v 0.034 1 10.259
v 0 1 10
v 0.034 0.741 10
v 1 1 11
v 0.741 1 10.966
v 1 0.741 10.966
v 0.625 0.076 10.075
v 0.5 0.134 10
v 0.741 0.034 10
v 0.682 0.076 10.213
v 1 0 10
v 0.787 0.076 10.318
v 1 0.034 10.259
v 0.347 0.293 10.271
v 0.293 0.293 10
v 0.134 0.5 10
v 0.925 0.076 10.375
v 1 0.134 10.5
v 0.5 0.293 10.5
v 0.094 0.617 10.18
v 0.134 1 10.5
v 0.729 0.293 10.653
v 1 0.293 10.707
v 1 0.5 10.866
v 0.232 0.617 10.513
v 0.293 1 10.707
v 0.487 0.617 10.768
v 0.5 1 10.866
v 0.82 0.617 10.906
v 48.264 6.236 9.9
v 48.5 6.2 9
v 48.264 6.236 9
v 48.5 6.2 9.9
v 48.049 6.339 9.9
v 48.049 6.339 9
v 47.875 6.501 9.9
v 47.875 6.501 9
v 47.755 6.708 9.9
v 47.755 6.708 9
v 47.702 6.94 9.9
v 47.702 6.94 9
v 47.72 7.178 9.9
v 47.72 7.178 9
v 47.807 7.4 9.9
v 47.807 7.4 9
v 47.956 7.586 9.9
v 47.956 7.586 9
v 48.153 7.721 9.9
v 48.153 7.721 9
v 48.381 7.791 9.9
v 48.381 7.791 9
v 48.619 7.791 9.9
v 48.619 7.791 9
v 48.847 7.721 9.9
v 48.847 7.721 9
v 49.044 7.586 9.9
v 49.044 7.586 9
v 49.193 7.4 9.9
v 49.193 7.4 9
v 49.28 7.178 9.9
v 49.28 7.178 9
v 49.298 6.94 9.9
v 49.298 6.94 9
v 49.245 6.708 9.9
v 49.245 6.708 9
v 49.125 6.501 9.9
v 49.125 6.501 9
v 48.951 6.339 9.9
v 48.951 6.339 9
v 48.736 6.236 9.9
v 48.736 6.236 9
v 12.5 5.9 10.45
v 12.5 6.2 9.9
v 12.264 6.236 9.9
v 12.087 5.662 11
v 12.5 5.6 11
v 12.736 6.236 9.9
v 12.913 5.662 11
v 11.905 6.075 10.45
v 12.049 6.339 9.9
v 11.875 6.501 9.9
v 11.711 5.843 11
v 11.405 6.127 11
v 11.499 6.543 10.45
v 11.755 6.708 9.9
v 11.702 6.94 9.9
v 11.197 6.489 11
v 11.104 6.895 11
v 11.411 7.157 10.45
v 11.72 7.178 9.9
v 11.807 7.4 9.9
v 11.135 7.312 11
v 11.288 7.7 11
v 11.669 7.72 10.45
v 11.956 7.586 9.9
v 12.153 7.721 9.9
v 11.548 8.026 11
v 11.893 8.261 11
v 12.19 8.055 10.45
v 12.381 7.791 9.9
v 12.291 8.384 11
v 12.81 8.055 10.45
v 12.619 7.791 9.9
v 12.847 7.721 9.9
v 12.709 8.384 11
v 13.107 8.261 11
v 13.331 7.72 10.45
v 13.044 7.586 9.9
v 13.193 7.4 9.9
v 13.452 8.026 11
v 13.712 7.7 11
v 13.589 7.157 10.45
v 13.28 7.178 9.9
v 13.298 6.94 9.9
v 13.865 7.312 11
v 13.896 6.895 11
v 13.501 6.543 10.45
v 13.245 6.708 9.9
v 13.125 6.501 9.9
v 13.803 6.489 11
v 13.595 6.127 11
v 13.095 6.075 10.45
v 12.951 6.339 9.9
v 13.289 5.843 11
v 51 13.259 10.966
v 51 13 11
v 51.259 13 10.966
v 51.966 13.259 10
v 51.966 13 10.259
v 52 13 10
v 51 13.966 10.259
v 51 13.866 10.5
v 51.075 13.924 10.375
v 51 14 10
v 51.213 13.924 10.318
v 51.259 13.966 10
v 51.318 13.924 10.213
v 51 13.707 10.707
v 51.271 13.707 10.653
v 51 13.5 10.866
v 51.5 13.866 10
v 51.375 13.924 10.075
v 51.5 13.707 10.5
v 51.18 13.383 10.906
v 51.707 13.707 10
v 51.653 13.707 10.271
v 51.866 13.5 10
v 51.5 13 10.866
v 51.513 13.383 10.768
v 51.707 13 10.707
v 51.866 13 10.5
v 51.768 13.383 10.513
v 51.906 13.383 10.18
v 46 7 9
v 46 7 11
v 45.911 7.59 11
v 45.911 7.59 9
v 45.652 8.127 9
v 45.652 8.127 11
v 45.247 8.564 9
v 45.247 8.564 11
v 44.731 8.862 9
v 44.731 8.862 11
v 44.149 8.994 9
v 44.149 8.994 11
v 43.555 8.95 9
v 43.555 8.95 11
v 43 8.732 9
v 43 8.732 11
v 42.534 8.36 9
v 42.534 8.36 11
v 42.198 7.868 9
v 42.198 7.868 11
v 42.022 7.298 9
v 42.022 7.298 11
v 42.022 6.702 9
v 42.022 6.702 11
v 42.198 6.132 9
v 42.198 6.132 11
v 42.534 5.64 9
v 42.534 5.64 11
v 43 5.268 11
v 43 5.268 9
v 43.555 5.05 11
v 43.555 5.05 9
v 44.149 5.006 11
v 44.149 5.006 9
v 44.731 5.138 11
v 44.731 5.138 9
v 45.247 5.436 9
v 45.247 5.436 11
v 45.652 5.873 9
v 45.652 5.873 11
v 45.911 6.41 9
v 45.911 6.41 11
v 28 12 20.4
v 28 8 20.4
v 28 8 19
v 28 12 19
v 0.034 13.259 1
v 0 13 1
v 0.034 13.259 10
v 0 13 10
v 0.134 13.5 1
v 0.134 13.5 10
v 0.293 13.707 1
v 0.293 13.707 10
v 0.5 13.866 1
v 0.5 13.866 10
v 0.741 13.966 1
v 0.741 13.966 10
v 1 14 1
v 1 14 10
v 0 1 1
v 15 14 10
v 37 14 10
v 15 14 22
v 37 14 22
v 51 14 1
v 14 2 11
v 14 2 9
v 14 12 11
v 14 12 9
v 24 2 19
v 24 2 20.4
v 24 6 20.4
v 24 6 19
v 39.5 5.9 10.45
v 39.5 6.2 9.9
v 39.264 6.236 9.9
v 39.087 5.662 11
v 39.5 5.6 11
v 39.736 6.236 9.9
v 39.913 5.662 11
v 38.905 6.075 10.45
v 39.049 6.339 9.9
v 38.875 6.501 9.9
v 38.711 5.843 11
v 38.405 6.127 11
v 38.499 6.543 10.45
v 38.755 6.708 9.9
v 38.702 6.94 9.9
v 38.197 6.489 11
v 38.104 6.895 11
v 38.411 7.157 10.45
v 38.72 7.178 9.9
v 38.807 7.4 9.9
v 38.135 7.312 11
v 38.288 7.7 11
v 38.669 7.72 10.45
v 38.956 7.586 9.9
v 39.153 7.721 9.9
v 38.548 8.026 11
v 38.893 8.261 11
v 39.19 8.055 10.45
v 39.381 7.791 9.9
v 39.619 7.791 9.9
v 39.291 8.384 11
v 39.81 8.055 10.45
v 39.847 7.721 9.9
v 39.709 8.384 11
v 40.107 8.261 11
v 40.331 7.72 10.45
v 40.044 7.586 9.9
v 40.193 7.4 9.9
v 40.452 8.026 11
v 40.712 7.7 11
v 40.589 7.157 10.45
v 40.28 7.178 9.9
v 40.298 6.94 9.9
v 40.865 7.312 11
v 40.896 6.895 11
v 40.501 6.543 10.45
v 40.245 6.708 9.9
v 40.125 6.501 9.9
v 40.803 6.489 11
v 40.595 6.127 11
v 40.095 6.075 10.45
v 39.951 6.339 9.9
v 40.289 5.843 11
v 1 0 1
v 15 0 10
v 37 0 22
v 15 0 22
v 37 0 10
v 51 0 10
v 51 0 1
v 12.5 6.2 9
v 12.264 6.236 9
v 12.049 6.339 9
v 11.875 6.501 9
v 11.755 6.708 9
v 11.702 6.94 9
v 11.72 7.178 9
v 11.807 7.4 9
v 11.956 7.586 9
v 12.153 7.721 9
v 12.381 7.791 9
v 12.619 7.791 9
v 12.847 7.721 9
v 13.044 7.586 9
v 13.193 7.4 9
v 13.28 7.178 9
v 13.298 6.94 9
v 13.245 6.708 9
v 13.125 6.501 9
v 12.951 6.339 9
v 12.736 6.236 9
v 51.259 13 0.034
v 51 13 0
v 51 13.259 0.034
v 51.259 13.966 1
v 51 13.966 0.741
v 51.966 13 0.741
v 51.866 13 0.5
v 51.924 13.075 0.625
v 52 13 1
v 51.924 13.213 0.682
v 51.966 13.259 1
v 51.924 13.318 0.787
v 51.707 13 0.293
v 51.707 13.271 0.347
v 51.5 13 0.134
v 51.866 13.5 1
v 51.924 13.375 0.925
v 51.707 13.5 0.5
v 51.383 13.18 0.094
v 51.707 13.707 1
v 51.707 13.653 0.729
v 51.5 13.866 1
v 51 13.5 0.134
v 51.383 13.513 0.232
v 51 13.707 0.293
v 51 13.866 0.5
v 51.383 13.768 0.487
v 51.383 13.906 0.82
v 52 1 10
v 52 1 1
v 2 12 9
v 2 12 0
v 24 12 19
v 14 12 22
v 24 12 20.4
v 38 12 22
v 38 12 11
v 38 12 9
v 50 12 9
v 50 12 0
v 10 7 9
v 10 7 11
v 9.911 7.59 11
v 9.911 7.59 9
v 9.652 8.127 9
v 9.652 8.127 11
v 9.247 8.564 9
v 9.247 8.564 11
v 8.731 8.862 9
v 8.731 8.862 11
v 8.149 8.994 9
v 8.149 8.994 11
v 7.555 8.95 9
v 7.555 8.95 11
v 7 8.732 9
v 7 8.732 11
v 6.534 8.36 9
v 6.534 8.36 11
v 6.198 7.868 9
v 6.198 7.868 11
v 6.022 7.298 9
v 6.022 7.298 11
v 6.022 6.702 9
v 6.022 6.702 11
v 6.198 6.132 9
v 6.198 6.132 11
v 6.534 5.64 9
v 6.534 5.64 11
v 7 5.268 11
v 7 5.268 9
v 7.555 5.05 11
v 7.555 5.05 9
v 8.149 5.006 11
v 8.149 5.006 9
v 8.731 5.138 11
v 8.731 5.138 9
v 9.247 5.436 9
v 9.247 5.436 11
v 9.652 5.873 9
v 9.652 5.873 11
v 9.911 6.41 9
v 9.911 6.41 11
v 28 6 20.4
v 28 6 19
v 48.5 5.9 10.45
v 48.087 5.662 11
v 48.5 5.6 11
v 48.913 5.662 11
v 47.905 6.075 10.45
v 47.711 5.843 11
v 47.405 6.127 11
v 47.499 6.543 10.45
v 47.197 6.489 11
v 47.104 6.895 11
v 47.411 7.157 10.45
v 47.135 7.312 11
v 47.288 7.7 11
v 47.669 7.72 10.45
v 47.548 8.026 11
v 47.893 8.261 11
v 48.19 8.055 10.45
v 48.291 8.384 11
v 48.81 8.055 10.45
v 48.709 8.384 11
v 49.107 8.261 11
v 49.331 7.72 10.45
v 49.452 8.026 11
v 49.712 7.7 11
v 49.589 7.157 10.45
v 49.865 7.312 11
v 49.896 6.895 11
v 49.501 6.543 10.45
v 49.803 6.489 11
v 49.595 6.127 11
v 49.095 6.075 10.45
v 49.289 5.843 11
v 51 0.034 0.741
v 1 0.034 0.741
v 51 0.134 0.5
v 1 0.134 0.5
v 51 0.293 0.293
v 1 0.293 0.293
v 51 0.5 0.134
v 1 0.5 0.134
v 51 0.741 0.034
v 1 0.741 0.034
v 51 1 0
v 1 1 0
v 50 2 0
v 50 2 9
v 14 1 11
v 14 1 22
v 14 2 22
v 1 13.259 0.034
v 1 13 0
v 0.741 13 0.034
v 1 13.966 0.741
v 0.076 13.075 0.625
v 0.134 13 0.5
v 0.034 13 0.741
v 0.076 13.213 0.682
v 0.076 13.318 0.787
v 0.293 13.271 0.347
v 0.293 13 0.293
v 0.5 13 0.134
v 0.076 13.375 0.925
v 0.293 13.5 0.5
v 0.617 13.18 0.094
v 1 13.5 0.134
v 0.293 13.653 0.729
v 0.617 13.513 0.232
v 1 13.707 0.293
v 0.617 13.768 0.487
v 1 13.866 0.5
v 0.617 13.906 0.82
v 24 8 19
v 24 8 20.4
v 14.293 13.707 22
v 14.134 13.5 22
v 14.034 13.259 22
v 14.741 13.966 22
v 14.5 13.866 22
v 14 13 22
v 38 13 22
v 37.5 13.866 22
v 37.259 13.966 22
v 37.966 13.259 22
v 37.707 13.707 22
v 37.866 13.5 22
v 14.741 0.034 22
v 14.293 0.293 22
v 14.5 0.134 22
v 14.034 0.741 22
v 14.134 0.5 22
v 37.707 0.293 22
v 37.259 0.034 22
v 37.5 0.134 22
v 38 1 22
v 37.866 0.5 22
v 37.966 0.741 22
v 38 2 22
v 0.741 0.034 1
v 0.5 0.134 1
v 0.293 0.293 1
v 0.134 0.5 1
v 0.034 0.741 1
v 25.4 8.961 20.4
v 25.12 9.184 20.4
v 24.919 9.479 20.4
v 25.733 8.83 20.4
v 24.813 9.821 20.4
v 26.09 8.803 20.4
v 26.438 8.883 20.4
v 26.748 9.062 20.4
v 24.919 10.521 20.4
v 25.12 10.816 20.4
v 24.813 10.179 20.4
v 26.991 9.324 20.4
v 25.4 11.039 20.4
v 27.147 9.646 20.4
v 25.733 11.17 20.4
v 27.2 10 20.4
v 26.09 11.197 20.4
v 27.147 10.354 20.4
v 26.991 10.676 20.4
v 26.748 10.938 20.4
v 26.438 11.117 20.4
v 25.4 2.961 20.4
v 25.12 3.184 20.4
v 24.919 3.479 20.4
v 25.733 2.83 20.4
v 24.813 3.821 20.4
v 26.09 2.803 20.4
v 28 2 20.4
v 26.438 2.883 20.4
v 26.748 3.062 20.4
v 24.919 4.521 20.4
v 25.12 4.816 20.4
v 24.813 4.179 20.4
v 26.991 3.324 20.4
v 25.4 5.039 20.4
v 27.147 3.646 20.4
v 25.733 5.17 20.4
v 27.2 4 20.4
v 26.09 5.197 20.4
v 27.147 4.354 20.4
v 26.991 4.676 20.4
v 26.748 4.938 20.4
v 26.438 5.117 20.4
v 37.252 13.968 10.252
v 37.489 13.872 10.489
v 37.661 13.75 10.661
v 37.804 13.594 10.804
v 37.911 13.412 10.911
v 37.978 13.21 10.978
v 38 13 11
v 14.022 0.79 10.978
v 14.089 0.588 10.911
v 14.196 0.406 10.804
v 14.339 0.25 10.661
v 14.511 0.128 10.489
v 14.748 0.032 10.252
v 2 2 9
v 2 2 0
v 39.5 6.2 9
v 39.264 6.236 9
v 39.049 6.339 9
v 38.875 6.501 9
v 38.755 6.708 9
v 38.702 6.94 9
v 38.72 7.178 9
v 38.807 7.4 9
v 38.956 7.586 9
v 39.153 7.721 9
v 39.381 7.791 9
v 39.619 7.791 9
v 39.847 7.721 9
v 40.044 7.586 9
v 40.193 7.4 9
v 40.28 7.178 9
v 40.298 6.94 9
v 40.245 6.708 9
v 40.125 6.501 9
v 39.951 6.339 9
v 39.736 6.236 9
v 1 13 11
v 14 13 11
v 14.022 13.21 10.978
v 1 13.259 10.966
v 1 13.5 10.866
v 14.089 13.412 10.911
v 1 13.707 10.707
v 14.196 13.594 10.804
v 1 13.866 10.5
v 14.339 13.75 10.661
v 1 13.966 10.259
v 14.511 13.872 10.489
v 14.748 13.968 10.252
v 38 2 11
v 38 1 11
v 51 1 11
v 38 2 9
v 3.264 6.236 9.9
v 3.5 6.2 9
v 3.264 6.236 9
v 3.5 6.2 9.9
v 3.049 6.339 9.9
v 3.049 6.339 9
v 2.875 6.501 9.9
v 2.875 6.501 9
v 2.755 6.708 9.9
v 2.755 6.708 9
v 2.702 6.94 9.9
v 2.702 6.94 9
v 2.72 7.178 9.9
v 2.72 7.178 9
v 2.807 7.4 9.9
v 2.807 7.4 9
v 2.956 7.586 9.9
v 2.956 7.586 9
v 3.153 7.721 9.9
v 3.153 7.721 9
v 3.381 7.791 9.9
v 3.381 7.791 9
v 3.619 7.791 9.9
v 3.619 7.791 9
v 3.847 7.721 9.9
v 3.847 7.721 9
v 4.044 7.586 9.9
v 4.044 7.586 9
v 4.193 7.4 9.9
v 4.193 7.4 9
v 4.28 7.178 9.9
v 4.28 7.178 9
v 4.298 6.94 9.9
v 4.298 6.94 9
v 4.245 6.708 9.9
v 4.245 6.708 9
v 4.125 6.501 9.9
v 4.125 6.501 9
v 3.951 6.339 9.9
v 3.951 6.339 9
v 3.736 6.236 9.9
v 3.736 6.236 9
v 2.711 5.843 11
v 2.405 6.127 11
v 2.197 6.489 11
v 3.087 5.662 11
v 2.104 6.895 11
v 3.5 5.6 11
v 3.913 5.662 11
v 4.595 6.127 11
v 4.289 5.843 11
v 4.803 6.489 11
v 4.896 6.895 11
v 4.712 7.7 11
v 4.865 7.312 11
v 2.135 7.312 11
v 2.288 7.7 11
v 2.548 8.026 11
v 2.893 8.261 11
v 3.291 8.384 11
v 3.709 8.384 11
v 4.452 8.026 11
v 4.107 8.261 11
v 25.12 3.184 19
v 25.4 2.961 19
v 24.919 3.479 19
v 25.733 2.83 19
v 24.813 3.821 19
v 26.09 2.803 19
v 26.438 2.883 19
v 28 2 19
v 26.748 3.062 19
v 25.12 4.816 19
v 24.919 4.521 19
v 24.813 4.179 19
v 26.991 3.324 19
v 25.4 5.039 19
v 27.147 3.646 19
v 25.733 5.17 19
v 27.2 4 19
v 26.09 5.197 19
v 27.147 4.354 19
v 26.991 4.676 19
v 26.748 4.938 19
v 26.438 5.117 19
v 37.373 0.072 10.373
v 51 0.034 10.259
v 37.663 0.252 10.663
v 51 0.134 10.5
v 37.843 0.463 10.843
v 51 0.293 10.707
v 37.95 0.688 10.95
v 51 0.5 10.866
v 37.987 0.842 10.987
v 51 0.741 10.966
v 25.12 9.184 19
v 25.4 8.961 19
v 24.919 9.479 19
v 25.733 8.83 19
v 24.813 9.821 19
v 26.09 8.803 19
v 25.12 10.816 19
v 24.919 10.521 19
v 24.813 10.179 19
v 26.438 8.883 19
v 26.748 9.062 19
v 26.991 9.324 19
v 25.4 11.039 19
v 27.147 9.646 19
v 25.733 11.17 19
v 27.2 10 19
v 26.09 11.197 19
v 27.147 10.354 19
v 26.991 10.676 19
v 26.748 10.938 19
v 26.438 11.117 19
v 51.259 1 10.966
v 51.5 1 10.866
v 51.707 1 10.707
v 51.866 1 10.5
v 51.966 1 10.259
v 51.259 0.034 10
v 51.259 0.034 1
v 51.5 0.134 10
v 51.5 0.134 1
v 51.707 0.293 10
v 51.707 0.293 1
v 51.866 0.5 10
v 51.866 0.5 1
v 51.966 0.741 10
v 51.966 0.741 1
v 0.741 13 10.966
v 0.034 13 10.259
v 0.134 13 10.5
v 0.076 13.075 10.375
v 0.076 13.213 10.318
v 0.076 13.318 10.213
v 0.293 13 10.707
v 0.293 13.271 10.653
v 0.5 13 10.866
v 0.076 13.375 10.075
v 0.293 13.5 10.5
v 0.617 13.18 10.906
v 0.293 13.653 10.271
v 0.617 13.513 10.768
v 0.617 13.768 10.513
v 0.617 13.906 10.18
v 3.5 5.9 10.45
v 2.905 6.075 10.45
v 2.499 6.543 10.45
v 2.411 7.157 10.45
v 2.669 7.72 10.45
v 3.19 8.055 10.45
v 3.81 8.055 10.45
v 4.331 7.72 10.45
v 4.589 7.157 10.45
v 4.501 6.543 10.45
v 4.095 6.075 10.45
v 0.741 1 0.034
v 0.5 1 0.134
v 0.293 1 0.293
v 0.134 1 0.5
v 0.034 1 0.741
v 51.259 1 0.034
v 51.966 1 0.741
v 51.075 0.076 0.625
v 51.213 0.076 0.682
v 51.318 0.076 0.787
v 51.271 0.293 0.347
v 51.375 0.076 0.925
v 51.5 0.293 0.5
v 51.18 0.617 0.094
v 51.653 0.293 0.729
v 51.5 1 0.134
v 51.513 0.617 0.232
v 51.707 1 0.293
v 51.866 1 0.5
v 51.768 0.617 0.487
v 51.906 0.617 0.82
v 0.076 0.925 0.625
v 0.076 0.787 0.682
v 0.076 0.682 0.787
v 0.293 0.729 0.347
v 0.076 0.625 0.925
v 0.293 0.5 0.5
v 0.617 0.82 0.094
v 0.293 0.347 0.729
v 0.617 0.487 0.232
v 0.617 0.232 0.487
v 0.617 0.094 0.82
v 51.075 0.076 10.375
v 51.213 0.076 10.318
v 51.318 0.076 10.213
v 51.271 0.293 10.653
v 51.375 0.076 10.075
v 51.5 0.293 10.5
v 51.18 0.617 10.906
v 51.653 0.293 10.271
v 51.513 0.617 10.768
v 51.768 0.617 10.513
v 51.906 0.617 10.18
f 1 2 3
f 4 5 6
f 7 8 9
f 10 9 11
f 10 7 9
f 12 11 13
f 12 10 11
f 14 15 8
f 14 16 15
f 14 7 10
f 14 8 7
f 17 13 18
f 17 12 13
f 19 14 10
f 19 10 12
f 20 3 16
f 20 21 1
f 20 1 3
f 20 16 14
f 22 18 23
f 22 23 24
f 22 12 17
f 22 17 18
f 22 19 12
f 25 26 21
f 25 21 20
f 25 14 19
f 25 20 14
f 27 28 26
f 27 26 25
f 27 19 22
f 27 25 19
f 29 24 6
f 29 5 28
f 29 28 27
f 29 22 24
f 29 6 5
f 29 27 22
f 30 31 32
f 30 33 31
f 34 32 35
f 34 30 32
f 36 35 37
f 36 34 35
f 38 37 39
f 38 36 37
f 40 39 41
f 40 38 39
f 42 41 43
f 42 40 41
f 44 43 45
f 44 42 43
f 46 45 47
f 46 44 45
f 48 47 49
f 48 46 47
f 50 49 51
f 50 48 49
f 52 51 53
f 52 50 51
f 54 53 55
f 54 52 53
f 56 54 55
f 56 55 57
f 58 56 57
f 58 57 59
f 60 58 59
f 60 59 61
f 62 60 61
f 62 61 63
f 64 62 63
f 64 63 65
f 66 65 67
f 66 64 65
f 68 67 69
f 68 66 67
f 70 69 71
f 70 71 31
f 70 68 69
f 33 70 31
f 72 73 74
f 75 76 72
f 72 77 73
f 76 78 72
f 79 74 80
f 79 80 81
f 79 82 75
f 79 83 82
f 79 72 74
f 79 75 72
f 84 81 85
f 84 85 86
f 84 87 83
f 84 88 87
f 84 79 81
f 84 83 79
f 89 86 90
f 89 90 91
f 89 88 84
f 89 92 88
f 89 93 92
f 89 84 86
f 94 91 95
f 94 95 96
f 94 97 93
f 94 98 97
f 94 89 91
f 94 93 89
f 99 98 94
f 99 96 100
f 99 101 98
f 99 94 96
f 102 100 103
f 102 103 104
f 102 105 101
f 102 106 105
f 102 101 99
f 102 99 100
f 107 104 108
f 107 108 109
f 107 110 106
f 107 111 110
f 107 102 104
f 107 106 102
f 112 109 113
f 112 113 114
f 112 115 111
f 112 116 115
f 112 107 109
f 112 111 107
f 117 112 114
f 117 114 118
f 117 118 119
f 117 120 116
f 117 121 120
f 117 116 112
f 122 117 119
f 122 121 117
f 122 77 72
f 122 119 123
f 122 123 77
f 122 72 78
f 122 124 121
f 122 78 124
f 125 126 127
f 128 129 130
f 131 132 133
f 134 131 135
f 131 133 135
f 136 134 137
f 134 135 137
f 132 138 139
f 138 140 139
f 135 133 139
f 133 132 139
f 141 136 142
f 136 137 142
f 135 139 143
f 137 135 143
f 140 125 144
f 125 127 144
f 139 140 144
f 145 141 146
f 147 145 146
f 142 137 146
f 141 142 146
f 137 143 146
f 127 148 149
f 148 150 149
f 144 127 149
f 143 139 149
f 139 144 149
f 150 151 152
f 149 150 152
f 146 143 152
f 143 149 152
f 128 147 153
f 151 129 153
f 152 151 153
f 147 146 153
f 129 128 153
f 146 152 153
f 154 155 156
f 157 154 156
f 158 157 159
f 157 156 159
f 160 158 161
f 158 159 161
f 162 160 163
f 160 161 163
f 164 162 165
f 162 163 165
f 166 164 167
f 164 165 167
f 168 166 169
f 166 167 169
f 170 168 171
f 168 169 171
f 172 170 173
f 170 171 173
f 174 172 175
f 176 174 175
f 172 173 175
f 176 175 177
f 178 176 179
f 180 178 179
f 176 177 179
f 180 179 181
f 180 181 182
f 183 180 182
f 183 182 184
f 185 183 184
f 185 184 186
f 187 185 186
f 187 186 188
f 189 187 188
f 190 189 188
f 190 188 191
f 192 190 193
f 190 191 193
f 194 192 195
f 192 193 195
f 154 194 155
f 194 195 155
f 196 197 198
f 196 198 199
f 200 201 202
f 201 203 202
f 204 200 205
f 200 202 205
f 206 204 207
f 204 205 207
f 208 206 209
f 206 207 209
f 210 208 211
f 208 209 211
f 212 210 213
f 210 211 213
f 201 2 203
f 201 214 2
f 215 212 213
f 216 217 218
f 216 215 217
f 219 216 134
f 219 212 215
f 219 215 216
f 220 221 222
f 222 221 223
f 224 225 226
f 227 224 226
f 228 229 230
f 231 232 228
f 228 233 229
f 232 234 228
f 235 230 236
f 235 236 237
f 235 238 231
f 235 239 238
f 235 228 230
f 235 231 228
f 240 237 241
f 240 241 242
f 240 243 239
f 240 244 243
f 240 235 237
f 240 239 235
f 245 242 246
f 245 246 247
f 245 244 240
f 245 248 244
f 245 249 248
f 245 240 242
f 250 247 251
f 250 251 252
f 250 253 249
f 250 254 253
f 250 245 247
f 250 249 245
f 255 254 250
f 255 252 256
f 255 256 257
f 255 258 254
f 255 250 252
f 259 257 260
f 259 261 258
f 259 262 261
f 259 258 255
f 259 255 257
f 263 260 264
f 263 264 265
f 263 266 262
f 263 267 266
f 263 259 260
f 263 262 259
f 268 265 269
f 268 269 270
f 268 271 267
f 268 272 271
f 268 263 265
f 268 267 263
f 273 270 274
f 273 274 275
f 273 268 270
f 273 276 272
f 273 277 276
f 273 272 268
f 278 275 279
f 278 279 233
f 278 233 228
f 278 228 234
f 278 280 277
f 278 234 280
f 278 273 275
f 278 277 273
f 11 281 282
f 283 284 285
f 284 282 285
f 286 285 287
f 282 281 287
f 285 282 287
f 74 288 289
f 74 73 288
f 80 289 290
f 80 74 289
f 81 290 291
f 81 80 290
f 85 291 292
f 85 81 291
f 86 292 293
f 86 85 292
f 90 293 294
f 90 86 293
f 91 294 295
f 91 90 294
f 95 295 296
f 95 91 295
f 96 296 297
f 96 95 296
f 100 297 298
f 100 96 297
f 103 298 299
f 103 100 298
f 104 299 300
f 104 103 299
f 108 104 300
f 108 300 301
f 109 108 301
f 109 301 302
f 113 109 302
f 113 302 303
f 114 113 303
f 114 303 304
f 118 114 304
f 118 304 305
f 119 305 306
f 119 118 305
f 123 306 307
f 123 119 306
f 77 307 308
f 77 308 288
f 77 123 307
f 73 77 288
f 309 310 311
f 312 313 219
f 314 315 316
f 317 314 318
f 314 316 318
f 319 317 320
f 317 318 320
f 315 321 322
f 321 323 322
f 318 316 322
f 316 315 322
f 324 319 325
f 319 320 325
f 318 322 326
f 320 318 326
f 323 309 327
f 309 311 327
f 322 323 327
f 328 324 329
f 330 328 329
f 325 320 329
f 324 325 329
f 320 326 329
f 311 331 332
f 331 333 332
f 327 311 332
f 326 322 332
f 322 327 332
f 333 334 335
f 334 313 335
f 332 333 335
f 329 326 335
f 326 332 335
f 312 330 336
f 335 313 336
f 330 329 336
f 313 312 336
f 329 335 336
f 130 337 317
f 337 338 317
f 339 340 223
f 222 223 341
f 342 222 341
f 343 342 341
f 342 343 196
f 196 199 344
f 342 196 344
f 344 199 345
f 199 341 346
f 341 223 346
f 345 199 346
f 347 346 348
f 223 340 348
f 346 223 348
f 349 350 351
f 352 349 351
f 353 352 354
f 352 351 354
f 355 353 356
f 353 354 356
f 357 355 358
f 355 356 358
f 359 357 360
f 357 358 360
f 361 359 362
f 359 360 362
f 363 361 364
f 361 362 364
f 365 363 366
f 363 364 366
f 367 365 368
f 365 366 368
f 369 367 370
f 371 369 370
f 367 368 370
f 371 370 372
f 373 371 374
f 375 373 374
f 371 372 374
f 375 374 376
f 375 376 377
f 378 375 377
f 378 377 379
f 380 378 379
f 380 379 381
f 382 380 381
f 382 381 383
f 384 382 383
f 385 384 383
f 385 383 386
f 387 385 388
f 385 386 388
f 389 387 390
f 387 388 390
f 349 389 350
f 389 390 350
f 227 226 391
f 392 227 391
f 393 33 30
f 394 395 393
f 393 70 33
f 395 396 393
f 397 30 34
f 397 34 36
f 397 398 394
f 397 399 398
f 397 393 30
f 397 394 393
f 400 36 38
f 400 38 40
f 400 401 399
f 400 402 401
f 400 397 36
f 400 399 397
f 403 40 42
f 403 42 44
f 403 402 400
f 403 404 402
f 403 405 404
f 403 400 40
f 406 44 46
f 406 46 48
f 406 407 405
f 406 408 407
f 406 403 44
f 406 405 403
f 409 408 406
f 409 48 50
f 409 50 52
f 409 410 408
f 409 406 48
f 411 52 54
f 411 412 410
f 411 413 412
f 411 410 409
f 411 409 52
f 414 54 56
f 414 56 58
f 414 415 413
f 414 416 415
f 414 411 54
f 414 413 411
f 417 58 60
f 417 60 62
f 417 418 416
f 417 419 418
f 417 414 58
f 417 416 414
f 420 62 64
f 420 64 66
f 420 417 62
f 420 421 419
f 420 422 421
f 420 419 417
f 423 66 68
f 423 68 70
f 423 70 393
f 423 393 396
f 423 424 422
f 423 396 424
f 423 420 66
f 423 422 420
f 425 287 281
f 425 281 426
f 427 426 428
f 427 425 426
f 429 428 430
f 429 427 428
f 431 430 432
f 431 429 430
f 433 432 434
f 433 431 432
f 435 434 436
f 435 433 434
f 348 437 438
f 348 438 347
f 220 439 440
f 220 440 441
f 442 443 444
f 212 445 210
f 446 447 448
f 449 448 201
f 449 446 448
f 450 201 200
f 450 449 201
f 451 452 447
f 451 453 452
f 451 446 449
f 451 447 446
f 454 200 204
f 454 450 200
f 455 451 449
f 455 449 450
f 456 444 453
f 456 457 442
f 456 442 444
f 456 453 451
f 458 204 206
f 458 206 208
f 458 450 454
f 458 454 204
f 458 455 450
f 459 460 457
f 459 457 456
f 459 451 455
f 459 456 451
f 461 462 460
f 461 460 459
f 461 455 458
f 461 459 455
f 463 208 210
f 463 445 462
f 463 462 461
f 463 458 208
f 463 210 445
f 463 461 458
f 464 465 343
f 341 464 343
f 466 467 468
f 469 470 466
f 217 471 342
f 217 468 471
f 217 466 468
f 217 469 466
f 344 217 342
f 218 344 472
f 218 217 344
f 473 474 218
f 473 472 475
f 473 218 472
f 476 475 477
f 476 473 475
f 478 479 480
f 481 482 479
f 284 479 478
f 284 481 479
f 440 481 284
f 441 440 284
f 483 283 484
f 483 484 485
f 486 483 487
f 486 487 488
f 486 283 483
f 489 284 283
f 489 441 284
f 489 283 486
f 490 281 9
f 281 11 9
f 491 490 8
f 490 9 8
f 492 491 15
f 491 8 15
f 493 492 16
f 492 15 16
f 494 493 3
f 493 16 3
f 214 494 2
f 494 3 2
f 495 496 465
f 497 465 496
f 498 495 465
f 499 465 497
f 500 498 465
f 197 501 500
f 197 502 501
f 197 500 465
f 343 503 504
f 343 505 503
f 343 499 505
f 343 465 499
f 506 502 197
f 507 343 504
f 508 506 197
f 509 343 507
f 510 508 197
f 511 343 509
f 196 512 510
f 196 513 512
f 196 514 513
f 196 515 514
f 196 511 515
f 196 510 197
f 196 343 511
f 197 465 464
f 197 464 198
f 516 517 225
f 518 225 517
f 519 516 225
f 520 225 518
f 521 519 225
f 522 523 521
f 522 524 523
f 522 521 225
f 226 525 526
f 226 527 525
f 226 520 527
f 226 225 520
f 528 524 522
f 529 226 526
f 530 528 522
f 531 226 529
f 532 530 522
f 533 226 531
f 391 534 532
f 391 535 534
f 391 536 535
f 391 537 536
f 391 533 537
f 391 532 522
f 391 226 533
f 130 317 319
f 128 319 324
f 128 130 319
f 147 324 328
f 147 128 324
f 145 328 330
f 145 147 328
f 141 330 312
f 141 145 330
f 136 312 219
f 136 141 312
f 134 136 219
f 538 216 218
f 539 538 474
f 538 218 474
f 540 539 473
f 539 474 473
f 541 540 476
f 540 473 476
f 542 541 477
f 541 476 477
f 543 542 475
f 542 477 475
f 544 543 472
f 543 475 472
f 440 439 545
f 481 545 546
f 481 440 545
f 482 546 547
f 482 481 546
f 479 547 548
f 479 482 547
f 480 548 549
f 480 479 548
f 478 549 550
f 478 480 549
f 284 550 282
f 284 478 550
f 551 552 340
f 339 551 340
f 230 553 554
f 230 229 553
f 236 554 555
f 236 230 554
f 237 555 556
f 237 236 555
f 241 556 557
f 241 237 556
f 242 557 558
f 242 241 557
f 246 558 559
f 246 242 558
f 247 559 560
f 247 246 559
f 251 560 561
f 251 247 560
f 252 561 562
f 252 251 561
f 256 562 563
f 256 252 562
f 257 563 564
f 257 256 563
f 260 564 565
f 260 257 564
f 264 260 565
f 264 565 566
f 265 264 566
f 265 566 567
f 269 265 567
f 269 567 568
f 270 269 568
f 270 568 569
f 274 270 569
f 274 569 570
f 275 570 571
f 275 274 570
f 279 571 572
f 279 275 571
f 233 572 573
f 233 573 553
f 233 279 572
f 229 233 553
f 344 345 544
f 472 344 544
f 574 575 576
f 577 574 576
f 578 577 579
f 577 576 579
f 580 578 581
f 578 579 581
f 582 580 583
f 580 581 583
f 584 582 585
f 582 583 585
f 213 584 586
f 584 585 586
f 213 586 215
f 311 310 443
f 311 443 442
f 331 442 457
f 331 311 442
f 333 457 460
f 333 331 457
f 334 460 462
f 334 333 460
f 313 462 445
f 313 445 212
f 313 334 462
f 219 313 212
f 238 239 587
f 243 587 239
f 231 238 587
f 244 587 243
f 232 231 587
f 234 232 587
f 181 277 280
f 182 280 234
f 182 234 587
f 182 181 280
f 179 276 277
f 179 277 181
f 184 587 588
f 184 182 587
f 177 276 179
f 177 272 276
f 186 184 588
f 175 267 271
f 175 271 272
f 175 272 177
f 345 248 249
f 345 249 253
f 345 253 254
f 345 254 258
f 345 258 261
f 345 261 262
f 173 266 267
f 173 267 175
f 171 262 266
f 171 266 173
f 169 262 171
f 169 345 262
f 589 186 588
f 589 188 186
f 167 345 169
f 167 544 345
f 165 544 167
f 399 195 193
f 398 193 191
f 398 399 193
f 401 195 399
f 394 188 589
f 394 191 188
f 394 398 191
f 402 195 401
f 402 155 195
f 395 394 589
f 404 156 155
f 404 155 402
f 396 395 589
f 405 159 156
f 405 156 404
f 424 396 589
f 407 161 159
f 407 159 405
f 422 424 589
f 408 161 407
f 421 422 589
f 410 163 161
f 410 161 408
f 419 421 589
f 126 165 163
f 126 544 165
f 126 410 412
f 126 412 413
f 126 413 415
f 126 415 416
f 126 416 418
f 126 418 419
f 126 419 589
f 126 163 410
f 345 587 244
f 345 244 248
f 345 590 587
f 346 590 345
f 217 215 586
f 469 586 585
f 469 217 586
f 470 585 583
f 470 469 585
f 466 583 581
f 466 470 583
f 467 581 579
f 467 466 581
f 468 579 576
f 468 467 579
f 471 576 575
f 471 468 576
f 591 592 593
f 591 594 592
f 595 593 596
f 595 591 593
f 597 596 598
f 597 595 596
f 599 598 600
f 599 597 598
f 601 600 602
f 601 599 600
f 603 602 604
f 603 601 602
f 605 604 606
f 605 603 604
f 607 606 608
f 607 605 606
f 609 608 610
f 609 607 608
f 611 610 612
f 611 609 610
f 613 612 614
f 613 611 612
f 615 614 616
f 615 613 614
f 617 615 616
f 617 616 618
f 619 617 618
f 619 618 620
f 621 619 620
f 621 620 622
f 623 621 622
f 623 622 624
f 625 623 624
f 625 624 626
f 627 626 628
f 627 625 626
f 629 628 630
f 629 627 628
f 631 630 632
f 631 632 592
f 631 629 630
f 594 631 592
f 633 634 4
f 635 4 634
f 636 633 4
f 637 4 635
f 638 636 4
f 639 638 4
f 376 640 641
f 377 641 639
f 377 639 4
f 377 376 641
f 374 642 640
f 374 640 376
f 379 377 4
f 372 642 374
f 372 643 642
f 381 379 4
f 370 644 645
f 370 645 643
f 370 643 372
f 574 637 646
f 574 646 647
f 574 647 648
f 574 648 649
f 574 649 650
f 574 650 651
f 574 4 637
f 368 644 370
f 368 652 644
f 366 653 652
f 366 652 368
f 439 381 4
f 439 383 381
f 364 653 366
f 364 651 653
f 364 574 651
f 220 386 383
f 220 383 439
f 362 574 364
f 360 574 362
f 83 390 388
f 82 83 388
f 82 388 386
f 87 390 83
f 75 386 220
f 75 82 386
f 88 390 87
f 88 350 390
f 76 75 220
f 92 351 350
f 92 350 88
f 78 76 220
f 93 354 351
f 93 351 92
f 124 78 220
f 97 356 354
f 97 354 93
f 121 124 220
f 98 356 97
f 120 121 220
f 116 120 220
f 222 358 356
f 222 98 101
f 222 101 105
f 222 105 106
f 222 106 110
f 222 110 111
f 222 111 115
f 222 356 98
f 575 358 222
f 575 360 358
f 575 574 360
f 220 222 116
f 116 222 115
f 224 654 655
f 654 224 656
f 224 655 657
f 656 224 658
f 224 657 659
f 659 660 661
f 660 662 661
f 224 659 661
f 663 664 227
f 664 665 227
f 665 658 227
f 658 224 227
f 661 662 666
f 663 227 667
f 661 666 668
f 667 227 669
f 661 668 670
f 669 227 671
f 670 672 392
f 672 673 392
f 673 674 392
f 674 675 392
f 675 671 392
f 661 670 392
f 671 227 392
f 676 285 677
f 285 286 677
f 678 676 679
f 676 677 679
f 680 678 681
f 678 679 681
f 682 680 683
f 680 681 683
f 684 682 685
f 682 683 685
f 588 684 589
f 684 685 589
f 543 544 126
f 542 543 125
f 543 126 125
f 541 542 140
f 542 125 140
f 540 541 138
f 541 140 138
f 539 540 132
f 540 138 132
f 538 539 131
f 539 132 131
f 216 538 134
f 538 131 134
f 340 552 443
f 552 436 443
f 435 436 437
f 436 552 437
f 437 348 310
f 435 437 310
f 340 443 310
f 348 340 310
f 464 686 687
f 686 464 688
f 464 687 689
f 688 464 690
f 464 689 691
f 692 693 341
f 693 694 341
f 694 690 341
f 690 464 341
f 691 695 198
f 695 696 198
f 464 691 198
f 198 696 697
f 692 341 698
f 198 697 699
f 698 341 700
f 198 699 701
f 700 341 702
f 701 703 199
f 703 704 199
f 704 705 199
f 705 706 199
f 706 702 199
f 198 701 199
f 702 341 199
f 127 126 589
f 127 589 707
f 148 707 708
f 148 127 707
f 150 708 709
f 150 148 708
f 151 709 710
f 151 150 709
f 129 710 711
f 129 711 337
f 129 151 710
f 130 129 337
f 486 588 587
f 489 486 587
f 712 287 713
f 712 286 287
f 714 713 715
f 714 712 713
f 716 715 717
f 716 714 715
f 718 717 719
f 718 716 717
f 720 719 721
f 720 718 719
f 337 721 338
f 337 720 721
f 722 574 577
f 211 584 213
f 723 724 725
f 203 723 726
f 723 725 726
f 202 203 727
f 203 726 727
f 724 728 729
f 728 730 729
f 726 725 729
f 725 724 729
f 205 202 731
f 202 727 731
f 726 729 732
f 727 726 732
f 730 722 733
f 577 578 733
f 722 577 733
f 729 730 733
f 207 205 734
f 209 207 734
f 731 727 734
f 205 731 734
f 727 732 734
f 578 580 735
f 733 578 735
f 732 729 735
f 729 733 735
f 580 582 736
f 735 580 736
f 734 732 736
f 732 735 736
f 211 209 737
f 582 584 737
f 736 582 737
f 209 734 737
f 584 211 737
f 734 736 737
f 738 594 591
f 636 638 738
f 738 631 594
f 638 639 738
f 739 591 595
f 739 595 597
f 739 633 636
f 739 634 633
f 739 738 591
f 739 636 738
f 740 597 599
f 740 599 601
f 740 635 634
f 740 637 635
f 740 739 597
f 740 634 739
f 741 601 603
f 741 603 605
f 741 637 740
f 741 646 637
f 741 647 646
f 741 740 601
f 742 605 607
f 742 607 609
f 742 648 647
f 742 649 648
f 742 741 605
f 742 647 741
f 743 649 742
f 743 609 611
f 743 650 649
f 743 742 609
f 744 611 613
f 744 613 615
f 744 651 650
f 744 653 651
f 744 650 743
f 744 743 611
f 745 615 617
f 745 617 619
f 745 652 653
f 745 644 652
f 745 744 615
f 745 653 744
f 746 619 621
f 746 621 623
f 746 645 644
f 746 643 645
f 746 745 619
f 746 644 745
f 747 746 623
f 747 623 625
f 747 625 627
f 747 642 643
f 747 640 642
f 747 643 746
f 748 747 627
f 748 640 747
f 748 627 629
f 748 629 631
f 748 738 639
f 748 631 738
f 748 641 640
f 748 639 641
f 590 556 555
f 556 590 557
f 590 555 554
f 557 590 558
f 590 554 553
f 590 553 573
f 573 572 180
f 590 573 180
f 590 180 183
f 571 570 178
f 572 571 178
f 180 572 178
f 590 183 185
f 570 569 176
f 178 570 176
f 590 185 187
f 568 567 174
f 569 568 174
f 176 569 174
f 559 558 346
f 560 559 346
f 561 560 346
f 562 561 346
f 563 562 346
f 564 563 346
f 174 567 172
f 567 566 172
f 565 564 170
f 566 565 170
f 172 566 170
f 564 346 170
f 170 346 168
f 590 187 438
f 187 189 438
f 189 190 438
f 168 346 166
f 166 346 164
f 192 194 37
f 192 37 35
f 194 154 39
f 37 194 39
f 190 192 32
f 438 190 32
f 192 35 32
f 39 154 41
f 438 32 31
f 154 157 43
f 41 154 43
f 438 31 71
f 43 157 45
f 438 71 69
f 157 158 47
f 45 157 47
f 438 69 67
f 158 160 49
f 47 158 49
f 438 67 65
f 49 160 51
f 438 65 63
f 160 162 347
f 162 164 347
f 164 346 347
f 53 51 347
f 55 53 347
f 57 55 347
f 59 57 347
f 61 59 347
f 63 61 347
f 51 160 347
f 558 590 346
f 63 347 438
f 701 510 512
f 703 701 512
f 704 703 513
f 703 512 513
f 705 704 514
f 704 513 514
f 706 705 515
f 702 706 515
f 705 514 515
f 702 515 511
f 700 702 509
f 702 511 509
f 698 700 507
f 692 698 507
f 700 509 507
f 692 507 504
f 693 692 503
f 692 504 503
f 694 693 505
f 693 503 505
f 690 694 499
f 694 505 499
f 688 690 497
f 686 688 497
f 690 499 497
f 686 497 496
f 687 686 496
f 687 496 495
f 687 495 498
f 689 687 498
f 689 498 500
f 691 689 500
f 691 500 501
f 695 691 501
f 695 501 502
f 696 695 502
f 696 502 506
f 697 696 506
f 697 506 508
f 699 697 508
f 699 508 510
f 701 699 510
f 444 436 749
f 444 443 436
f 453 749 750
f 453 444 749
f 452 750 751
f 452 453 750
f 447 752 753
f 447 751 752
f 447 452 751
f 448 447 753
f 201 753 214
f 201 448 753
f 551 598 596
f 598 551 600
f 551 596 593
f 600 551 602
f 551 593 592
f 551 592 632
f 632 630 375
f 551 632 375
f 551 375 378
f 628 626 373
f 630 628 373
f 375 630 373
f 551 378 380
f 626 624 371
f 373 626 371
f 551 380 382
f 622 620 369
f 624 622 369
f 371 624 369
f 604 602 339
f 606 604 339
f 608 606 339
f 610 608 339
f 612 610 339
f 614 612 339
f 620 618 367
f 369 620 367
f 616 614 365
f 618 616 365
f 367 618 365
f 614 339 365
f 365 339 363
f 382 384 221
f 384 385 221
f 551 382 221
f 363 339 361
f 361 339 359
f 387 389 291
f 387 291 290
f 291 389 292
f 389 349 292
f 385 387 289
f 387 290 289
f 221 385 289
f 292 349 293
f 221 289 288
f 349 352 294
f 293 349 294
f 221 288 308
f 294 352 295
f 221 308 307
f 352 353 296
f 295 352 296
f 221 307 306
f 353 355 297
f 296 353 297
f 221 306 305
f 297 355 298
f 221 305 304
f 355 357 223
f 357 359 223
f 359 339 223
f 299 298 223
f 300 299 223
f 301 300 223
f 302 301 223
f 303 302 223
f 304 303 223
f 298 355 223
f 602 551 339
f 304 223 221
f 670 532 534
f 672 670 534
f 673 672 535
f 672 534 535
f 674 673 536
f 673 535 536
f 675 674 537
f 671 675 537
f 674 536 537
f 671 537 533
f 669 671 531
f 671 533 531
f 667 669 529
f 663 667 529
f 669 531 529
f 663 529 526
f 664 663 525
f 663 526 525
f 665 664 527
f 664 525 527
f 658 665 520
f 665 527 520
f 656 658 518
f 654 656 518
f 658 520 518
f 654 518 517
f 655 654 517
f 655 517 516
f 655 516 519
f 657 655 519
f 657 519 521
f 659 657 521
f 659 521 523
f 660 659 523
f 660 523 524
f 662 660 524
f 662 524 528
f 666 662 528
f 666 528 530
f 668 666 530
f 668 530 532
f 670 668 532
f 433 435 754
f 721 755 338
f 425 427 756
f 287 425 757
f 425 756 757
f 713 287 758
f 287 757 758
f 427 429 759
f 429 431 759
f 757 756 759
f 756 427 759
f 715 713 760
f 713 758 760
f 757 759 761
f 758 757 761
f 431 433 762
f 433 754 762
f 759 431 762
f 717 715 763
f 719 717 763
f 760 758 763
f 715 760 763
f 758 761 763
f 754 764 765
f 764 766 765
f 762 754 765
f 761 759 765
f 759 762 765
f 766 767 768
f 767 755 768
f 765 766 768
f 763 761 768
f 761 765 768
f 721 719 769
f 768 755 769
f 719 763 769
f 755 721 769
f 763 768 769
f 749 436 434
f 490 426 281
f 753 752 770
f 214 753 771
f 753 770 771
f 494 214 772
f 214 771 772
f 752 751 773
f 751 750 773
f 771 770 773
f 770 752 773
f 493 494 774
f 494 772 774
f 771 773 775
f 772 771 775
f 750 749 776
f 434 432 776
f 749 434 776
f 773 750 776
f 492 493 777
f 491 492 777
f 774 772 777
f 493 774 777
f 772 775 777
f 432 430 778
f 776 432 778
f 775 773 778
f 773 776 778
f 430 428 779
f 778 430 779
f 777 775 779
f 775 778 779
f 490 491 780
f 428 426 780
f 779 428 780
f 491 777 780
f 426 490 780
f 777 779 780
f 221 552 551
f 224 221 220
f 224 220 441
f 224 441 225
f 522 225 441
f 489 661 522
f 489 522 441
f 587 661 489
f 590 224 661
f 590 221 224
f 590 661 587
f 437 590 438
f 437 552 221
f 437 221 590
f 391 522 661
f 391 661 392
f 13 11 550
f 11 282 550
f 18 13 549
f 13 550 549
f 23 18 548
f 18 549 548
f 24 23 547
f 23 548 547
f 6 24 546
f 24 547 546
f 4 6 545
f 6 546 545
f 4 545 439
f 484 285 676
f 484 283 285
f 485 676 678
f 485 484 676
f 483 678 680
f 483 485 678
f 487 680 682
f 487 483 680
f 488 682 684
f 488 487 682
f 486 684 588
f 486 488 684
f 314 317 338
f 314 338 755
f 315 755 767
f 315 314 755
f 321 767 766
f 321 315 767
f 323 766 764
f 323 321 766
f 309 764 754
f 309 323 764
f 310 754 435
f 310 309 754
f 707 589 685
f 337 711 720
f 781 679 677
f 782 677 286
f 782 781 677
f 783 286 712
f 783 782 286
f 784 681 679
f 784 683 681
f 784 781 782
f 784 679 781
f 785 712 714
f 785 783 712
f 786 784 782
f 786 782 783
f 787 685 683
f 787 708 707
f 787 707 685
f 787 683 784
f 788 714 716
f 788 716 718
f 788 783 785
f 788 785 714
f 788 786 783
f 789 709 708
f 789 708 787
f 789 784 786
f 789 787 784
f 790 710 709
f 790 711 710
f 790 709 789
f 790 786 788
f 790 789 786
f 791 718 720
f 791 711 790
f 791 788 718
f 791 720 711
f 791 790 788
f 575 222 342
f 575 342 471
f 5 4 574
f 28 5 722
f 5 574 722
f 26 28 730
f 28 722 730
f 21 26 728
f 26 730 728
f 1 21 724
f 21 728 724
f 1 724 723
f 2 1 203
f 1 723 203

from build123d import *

# Parameters (mm, degrees)
SKETCH_1_W           = 52
SKETCH_1_H           = 14
EXTRUDE_1_DEPTH      = 11
SHELL_1_T            = -2
SKETCH_2_W           = 24
SKETCH_2_H           = 10
CUT_EXTRUDE_1_DEPTH  = 2
SKETCH_3_W           = 24
SKETCH_3_H           = 2
EXTRUDE_2_DEPTH      = 11
SKETCH_8_R           = 2
CUT_EXTRUDE_5_DEPTH  = 2
SKETCH_15_W          = 4
SKETCH_15_H          = 4
EXTRUDE_4_DEPTH      = 3
SKETCH_16_R          = 1.2
CUT_EXTRUDE_10_DEPTH = 10
FILLET_1_R           = 1
SKETCH_17_W          = 24
SKETCH_17_H          = 10
CUT_EXTRUDE_11_DEPTH = 1.6


with BuildPart() as part:
    # 草图1 → 凸台-拉伸1 (new body)
    with BuildSketch(Plane.XY):
        with Locations((26, 7)):
            Rectangle(SKETCH_1_W, SKETCH_1_H)
    extrude(amount=EXTRUDE_1_DEPTH)

    # 抽壳1
    shell_1_openings = [part.faces().sort_by_distance(p)[0] for p in [
        (26, 7, 0),
    ]]
    offset(amount=SHELL_1_T, openings=shell_1_openings, kind=Kind.INTERSECTION)

    # 草图2 → 切除-拉伸1 (cut)
    with BuildSketch(Plane(origin=(0, 0, 9), x_dir=(-1, 0, 0), z_dir=(0, 0, -1))):
        with Locations((-26, 7)):
            Rectangle(SKETCH_2_W, SKETCH_2_H)
    extrude(amount=-CUT_EXTRUDE_1_DEPTH, mode=Mode.SUBTRACT)

    # 草图3 → 凸台-拉伸2 (add)
    with BuildSketch(Plane.XY.offset(11)):
        with Locations((26, 1)):
            Rectangle(SKETCH_3_W, SKETCH_3_H)
        with Locations((26, 13)):
            Rectangle(SKETCH_3_W, SKETCH_3_H)
    extrude(amount=EXTRUDE_2_DEPTH)

    # 草图8 → 切除-拉伸5 (cut)
    with BuildSketch(Plane.XY.offset(11)):
        with Locations((8, 7)):
            Circle(SKETCH_8_R)
        with Locations((44, 7)):
            Circle(SKETCH_8_R)
    extrude(amount=-CUT_EXTRUDE_5_DEPTH, mode=Mode.SUBTRACT)

    # 草图15 → 凸台-拉伸4 (add)
    with BuildSketch(Plane.XY.offset(22)):
        with Locations((26, 4)):
            Rectangle(SKETCH_15_W, SKETCH_15_H)
        with Locations((26, 10)):
            Rectangle(SKETCH_15_W, SKETCH_15_H)
    extrude(amount=-EXTRUDE_4_DEPTH)

    # 草图19 → 切除-旋转6 (revolve, cut)
    with BuildSketch(Plane(origin=(0, 7, 0), x_dir=(1, 0, 0), z_dir=(0, 1, 0)), mode=Mode.PRIVATE) as cut_revolve_6_sk:
        Polygon((2.1, -11), (3.5, -11), (3.5, -9), (2.7, -9), (2.7, -9.9), align=None)
    revolve(cut_revolve_6_sk.sketch.rotate(Axis((3.5, 7, 11), (0, 0, -1)), 270), axis=Axis((3.5, 7, 11), (0, 0, -1)), mode=Mode.SUBTRACT)

    # 草图20 → 切除-旋转7 (revolve, cut)
    with BuildSketch(Plane(origin=(0, 7, 0), x_dir=(1, 0, 0), z_dir=(0, 1, 0)), mode=Mode.PRIVATE) as cut_revolve_7_sk:
        Polygon((11.1, -11), (12.5, -11), (12.5, -9), (11.7, -9), (11.7, -9.9), align=None)
    revolve(cut_revolve_7_sk.sketch.rotate(Axis((12.5, 7, 11), (0, 0, -1)), 270), axis=Axis((12.5, 7, 11), (0, 0, -1)), mode=Mode.SUBTRACT)

    # 草图21 → 切除-旋转8 (revolve, cut)
    with BuildSketch(Plane(origin=(0, 7, 0), x_dir=(1, 0, 0), z_dir=(0, 1, 0)), mode=Mode.PRIVATE) as cut_revolve_8_sk:
        Polygon((38.1, -11), (39.5, -11), (39.5, -9), (38.7, -9), (38.7, -9.9), align=None)
    revolve(cut_revolve_8_sk.sketch.rotate(Axis((39.5, 7, 11), (0, 0, -1)), 270), axis=Axis((39.5, 7, 11), (0, 0, -1)), mode=Mode.SUBTRACT)

    # 草图22 → 切除-旋转9 (revolve, cut)
    with BuildSketch(Plane(origin=(0, 7, 0), x_dir=(1, 0, 0), z_dir=(0, 1, 0)), mode=Mode.PRIVATE) as cut_revolve_9_sk:
        Polygon((47.1, -11), (48.5, -11), (48.5, -9), (47.7, -9), (47.7, -9.9), align=None)
    revolve(cut_revolve_9_sk.sketch.rotate(Axis((48.5, 7, 11), (0, 0, -1)), 270), axis=Axis((48.5, 7, 11), (0, 0, -1)), mode=Mode.SUBTRACT)

    # 草图16 → 切除-拉伸10 (cut)
    with BuildSketch(Plane.XY.offset(22)):
        with Locations((26, 10)):
            Circle(SKETCH_16_R)
        with Locations((26, 4)):
            Circle(SKETCH_16_R)
    extrude(amount=-CUT_EXTRUDE_10_DEPTH, mode=Mode.SUBTRACT)

    # 圆角1
    fillet_1_edges = [part.edges().sort_by_distance(p)[0] for p in [
        (52, 7, 11),
        (45, 14, 11),
        (45, 0, 11),
        (7, 14, 11),
        (38, 0, 16.5),
        (14, 0, 16.5),
        (0, 7, 11),
        (26, 14, 0),
        (14, 14, 16.5),
        (38, 14, 16.5),
        (52, 7, 0),
        (26, 0, 0),
        (0, 7, 0),
        (0, 14, 5.5),
        (52, 14, 5.5),
        (52, 0, 5.5),
        (0, 0, 5.5),
        (7, 0, 11),
    ]]
    fillet(fillet_1_edges, radius=FILLET_1_R)

    # 草图17 → 切除-拉伸11 (cut)
    with BuildSketch(Plane.XY.offset(22)):
        with Locations((26, 7)):
            Rectangle(SKETCH_17_W, SKETCH_17_H)
    extrude(amount=-CUT_EXTRUDE_11_DEPTH, mode=Mode.SUBTRACT)


solid = part.part
